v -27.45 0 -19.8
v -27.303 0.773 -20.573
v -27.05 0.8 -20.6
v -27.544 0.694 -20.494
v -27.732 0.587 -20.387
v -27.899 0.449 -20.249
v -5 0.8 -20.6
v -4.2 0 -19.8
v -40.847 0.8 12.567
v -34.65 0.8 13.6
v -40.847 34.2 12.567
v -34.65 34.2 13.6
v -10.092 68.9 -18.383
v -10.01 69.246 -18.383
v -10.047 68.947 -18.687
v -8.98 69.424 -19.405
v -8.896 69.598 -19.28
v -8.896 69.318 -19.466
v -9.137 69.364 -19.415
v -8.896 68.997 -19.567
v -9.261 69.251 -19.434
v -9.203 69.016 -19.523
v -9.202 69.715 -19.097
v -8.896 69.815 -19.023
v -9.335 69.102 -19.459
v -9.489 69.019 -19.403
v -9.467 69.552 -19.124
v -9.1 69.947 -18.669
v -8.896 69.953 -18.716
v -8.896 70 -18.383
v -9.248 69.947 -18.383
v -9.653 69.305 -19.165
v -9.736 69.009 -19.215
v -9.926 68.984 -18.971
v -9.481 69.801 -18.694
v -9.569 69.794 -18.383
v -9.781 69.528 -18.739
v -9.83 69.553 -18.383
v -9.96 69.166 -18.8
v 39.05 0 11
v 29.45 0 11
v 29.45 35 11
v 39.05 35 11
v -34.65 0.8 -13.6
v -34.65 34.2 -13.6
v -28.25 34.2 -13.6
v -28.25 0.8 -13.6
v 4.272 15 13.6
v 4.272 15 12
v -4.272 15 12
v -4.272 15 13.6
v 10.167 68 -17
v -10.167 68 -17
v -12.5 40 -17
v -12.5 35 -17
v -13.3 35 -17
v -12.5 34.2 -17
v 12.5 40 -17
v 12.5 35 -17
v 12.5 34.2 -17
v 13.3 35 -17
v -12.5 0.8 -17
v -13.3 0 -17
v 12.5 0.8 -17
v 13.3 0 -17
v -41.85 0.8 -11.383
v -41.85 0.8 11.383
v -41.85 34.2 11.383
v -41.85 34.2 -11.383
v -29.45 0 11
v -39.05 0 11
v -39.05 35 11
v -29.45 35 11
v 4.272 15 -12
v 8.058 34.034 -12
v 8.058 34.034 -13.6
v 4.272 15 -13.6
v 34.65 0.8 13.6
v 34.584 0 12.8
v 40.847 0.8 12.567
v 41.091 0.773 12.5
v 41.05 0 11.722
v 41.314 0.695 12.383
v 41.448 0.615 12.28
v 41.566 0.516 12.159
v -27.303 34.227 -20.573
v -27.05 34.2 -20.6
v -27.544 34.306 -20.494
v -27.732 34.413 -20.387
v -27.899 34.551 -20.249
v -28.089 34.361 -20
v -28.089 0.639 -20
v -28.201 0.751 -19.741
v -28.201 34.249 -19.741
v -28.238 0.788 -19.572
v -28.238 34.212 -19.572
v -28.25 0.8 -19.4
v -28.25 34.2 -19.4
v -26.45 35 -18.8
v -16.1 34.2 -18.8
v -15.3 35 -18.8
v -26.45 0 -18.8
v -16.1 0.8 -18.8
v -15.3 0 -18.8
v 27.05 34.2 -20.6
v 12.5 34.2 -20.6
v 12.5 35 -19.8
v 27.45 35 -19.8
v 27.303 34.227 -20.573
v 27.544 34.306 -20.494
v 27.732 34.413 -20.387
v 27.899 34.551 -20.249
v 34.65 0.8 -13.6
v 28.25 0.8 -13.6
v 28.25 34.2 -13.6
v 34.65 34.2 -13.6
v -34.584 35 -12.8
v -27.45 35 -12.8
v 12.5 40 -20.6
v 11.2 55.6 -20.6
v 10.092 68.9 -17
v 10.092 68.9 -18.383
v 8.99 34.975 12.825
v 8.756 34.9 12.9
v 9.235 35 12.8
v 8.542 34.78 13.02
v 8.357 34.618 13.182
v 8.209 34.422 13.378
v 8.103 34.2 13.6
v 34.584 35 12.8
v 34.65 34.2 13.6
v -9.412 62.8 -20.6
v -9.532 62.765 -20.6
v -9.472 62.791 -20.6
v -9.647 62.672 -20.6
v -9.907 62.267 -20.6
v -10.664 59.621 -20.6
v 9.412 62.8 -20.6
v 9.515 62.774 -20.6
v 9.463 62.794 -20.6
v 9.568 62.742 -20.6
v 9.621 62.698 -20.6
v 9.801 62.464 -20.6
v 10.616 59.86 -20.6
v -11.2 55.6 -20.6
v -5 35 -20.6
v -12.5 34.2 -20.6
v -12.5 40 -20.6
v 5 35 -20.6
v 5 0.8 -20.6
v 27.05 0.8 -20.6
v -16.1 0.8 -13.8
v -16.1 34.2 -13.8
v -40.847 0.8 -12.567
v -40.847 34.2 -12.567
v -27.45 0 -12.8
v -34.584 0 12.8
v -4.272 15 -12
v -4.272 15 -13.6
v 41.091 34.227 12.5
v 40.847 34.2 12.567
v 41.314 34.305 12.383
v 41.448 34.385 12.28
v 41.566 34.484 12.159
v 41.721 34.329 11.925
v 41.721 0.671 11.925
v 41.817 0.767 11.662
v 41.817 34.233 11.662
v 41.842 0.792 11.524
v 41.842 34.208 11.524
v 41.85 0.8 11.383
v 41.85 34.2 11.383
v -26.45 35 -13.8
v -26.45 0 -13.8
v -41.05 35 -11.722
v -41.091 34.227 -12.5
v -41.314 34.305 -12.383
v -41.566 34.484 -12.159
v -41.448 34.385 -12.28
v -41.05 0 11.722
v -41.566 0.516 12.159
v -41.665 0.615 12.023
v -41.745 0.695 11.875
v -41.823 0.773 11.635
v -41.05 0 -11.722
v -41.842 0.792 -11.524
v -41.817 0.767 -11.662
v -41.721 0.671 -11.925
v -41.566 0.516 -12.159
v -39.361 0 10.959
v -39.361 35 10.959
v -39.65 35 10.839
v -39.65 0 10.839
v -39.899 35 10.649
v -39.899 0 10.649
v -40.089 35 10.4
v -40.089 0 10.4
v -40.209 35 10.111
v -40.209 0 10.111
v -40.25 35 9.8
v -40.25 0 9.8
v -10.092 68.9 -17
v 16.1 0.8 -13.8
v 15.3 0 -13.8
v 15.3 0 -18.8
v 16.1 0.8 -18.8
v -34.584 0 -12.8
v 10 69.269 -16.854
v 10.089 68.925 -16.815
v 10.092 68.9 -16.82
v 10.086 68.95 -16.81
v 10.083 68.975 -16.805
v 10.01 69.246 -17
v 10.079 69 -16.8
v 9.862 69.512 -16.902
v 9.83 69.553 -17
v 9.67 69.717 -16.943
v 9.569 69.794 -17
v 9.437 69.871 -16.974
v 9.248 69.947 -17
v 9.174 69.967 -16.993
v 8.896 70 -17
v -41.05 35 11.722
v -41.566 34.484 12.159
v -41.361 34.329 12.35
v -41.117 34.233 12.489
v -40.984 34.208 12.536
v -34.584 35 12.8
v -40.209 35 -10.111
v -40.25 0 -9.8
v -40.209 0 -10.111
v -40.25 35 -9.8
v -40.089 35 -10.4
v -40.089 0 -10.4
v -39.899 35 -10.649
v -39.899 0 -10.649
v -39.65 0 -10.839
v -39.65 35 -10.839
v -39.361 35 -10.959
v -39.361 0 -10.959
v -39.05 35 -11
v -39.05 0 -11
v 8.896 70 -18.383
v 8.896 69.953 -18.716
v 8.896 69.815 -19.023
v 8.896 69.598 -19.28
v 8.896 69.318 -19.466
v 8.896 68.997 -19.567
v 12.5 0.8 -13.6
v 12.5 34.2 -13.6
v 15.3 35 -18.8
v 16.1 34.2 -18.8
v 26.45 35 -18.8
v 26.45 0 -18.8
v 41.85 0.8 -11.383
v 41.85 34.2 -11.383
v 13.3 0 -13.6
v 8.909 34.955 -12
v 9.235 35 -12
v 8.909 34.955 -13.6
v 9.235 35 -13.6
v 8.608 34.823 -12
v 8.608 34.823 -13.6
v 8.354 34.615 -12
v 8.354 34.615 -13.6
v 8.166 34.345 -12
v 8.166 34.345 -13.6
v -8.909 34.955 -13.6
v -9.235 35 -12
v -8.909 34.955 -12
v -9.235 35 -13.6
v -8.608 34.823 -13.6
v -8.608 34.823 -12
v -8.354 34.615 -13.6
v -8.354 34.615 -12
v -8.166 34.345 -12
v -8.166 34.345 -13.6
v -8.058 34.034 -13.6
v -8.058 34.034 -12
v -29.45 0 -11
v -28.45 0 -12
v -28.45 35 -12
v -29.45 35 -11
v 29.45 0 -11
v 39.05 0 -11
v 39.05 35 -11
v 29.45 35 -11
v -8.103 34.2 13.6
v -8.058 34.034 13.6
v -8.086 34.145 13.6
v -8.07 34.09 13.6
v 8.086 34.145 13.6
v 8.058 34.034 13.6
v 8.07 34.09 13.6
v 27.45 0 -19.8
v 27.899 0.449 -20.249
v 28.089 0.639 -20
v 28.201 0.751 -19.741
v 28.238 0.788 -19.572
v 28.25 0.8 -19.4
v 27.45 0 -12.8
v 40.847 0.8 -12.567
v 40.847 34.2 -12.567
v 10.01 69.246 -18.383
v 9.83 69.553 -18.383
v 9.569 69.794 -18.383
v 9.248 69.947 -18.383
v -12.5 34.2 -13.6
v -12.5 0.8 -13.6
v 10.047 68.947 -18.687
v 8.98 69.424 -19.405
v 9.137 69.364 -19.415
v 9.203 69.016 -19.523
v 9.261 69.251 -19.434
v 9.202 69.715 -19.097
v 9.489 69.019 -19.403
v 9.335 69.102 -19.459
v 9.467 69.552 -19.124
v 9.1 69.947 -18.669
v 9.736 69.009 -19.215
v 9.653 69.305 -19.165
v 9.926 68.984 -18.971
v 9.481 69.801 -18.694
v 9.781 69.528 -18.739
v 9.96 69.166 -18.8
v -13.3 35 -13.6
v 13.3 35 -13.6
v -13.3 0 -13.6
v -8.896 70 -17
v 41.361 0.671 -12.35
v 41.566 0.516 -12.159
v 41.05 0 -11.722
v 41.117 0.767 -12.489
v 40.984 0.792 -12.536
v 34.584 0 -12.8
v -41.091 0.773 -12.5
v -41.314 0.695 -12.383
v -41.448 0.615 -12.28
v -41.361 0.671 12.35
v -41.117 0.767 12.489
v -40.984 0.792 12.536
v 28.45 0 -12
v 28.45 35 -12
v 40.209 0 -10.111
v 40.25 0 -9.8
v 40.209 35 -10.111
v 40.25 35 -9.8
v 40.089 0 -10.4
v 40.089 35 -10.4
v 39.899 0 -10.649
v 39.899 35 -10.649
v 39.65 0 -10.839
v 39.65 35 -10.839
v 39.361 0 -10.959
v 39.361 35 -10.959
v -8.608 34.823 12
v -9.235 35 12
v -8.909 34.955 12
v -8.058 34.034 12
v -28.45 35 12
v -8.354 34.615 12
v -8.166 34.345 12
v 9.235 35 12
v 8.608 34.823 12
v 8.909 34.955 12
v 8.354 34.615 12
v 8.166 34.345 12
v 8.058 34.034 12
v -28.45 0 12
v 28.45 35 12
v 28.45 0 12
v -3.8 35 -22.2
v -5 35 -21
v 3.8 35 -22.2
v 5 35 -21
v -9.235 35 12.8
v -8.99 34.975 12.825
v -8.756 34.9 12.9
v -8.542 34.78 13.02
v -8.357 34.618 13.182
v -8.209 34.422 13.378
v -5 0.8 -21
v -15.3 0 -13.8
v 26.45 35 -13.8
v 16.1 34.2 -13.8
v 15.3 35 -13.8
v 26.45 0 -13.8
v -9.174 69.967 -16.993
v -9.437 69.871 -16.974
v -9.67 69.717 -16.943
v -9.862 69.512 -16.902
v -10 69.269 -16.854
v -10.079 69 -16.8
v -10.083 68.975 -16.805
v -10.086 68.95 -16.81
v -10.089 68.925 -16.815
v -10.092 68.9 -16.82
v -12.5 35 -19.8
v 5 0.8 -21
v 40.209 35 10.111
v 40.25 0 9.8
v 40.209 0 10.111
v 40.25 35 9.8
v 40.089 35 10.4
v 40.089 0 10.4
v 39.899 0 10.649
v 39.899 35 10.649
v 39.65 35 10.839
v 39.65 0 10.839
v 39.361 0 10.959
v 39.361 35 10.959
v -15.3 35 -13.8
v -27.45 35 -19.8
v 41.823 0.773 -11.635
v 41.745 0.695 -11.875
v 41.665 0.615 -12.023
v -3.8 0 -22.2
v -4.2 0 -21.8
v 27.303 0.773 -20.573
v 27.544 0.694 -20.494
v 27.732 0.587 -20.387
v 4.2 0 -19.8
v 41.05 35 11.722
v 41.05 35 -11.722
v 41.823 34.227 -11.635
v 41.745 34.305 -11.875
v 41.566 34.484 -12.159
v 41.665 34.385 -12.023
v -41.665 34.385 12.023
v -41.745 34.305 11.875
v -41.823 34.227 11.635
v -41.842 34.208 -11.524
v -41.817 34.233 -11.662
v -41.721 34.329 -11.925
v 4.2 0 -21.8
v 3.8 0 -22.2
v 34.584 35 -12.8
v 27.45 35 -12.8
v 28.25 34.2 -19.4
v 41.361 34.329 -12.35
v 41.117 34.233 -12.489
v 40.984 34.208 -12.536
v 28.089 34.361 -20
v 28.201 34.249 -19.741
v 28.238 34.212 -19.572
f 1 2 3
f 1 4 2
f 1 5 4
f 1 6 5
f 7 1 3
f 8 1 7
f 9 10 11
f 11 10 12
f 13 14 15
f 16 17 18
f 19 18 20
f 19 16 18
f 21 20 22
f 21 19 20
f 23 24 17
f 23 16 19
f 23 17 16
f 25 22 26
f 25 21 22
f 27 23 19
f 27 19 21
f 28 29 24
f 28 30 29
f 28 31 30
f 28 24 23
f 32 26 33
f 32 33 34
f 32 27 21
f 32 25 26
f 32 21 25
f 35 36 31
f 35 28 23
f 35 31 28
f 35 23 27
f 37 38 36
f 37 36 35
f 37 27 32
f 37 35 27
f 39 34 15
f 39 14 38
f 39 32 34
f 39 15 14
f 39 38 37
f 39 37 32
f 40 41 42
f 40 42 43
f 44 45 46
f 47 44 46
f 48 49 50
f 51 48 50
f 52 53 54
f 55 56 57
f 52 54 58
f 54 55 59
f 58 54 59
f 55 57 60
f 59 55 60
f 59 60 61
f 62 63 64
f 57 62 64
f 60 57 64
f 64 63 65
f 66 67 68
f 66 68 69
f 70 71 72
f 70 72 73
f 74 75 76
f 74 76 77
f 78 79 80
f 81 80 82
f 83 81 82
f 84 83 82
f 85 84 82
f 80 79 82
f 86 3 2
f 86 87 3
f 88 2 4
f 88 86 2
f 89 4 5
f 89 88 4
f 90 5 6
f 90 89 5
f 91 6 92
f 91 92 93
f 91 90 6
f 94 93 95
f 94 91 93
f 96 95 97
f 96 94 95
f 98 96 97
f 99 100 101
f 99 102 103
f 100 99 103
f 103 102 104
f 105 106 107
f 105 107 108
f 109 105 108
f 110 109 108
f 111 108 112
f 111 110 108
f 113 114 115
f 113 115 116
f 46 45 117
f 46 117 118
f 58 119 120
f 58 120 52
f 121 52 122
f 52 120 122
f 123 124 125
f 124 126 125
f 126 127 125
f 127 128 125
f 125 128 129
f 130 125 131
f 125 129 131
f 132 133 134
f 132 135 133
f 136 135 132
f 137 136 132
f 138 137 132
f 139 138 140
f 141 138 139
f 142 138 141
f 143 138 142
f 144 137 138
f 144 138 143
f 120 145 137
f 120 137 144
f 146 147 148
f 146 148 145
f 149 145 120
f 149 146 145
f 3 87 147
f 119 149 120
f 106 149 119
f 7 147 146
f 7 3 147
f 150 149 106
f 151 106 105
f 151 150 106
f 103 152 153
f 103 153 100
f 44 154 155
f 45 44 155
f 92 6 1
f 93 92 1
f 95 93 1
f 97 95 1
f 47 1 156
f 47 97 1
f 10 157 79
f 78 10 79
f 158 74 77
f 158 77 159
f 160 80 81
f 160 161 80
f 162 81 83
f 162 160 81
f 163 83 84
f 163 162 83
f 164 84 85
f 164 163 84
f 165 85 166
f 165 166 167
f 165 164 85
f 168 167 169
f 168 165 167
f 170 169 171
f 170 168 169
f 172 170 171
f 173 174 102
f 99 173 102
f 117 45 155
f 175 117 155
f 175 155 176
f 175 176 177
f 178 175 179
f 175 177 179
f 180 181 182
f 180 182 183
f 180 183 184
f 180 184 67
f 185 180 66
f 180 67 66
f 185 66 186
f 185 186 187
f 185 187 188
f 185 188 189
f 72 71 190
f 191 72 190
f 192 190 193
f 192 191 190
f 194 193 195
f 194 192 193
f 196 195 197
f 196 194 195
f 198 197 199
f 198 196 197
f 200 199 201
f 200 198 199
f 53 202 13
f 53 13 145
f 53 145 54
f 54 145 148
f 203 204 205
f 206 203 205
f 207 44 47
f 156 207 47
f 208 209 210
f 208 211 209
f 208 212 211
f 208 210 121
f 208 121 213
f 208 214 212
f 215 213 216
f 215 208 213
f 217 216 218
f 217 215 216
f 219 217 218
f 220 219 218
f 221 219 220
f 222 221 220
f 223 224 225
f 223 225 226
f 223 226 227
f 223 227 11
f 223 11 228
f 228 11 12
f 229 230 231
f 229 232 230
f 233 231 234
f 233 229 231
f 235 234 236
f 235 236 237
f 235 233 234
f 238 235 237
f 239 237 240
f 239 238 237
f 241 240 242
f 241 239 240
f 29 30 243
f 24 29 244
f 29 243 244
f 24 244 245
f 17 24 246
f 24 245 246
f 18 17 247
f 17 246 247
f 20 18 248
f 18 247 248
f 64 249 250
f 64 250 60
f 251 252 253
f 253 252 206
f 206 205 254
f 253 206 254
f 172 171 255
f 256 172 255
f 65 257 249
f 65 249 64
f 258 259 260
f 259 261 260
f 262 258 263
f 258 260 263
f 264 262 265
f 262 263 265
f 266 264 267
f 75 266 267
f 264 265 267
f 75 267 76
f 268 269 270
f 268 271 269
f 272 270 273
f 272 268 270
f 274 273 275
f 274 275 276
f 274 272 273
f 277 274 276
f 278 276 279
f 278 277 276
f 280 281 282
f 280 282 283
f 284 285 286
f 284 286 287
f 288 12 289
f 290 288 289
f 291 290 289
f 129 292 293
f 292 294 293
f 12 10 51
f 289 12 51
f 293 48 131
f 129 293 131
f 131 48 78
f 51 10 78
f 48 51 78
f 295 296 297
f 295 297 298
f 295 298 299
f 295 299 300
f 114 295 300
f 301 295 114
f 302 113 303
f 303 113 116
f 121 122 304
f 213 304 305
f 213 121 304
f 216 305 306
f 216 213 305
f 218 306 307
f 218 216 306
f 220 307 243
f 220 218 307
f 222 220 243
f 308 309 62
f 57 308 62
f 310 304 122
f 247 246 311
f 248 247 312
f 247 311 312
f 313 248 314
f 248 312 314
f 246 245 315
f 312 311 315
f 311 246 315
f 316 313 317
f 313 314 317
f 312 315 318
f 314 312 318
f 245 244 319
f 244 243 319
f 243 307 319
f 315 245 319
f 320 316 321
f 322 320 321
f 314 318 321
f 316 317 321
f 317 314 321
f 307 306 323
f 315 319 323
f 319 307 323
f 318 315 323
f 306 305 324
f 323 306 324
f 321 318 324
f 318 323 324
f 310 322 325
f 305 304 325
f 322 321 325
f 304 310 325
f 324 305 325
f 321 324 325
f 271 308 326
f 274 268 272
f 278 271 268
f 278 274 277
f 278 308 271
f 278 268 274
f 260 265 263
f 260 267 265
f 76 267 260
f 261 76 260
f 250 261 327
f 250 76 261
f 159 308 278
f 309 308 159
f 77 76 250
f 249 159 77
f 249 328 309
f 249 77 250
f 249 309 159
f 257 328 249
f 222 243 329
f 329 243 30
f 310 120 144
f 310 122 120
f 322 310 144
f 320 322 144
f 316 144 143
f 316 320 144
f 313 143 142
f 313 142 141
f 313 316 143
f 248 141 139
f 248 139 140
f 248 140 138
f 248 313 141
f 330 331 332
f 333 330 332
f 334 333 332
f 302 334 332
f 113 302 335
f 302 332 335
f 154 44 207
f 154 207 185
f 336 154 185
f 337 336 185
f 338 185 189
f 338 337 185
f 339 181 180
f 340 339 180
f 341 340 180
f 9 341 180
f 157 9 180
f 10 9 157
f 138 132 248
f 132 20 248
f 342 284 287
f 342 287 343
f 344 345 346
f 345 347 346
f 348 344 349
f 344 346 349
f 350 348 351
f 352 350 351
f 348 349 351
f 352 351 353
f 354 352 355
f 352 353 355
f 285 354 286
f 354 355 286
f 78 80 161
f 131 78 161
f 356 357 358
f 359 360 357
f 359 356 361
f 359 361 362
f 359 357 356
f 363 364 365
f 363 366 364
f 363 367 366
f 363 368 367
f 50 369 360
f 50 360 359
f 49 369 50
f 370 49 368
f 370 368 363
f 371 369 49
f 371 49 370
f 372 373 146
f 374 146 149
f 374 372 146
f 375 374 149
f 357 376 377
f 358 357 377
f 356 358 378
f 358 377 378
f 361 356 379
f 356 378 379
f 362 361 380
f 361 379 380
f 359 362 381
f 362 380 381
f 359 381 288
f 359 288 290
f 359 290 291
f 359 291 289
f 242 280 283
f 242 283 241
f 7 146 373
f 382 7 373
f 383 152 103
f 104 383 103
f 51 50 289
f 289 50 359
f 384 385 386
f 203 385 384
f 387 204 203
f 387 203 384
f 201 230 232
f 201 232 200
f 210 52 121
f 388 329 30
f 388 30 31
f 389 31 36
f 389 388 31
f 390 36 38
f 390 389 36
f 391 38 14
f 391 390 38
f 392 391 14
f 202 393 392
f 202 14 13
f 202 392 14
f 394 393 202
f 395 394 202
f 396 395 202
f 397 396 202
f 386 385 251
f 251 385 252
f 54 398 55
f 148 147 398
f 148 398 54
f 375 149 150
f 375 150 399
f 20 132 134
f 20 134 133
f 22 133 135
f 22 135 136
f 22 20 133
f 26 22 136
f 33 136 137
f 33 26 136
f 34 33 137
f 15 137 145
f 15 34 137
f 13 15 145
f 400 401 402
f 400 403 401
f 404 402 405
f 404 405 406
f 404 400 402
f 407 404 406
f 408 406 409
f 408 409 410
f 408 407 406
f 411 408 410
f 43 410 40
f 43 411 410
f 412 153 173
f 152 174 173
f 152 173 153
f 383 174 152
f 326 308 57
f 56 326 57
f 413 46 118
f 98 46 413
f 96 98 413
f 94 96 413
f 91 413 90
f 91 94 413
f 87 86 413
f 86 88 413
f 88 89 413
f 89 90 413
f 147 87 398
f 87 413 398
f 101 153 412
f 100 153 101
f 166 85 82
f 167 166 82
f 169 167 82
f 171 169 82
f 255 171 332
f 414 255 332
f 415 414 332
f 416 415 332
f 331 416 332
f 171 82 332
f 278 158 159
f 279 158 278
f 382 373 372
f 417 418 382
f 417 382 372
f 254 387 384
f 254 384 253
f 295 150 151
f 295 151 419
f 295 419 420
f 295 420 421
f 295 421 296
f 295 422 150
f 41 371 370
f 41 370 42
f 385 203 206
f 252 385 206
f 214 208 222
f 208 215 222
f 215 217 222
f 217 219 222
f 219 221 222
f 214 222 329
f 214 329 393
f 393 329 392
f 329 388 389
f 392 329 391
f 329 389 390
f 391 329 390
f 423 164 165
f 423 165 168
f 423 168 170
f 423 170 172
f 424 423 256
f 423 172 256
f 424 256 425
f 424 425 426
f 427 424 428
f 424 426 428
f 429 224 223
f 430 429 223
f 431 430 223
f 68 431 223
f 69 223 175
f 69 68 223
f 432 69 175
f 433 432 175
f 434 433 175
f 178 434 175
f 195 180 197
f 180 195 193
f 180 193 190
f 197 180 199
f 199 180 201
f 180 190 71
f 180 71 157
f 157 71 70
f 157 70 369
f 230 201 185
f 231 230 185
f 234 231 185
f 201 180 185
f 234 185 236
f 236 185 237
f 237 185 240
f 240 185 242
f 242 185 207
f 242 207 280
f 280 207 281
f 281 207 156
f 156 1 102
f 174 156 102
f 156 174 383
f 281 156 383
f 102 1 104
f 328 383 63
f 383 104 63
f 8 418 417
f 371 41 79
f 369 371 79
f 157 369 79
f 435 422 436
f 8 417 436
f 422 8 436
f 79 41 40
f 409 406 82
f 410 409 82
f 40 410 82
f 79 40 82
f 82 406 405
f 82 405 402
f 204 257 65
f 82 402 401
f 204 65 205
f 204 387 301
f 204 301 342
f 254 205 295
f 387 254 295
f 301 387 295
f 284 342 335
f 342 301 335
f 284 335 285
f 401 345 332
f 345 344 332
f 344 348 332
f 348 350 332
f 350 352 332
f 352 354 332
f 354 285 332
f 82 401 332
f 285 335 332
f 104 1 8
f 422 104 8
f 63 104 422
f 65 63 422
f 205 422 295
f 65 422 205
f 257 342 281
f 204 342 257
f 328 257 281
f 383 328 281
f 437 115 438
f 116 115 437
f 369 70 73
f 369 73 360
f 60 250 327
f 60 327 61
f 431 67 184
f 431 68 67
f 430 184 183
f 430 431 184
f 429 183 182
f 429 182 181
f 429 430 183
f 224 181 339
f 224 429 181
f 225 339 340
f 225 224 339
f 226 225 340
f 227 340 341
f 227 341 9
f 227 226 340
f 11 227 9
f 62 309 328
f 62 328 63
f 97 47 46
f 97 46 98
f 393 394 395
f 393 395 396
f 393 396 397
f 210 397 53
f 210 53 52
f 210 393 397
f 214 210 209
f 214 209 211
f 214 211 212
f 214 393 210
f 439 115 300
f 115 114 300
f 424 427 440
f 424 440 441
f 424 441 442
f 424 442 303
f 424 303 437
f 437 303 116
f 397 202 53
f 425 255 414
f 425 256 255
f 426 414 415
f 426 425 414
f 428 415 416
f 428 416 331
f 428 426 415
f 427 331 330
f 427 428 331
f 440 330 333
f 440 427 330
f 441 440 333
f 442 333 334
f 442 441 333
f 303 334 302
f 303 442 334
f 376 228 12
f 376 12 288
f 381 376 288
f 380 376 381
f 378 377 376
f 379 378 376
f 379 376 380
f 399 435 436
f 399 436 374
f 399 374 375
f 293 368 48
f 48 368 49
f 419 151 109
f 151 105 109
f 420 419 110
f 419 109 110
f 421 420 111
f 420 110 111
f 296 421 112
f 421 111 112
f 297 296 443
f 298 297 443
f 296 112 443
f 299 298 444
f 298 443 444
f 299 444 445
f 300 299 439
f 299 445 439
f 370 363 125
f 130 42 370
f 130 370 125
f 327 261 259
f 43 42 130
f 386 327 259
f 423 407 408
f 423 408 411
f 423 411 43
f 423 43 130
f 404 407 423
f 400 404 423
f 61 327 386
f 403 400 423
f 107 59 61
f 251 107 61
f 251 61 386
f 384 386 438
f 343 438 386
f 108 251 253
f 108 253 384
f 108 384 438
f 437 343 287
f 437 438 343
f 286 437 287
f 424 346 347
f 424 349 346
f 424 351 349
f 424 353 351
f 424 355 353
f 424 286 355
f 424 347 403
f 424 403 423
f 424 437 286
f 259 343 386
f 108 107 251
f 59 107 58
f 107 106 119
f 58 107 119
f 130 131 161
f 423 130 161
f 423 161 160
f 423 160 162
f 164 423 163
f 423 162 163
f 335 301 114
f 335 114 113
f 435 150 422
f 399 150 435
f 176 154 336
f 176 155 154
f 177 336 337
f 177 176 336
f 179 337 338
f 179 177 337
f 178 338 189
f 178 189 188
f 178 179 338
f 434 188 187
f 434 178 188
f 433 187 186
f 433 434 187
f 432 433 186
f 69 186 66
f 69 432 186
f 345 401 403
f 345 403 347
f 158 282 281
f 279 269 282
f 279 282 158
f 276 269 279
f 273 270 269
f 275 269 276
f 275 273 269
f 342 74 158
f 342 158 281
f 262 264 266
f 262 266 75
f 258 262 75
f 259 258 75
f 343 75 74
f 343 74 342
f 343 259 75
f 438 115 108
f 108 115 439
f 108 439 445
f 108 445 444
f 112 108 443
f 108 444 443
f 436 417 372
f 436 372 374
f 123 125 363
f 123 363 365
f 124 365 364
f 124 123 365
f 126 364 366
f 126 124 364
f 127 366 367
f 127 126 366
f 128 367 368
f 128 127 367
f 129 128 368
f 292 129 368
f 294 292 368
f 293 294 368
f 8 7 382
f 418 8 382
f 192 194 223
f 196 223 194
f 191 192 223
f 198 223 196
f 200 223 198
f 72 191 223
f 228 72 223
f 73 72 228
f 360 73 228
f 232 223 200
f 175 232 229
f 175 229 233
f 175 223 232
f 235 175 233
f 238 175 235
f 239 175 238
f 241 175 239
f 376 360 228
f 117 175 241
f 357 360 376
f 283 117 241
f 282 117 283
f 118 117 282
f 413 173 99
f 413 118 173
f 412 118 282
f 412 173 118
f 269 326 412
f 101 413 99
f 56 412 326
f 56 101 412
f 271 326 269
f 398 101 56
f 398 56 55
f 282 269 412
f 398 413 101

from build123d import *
from OCP.BRepFilletAPI import BRepFilletAPI_MakeChamfer

# Parameters (mm, degrees)
SKETCH1_W                      = 83.7
SKETCH1_H                      = 27.2
BOSS_EXTRUDE1_DEPTH            = 35
CUT_EXTRUDE1_REACH             = 58.226
SKETCH3_W                      = 56.5
SKETCH3_H                      = 3.4
BOSS_EXTRUDE2_DEPTH            = 3.2
SKETCH4_W                      = 56.5
SKETCH4_H                      = 3.6
BOSS_EXTRUDE3_DEPTH            = 70
CUT_EXTRUDE2_START             = -20.6
SKETCH5_W                      = 15.75
SKETCH5_H                      = 35
CUT_EXTRUDE2_DEPTH             = 3.6
SKETCH6_W                      = 15.75
SKETCH6_H                      = 3.4
BOSS_EXTRUDE4_DEPTH            = 35
CUT_EXTRUDE3_REACH             = 86.118
SKETCH7_W                      = 25
SKETCH7_H                      = 3.4
CUT_EXTRUDE4_START             = -20.6
CUT_EXTRUDE4_DEPTH             = 3.6
CUT_EXTRUDE5_REACH             = 86.118
SKETCH9_W                      = 10.35
SKETCH9_H                      = 5
CUT_EXTRUDE6_REACH             = 86.118
CUT_EXTRUDE6_DIRECTION_2_REACH = 86.118
SKETCH11_W                     = 10
SKETCH11_H                     = 1.6
BOSS_EXTRUDE5_DEPTH            = 35
BOSS_EXTRUDE6_START            = -17
BOSS_EXTRUDE6_DEPTH            = 0.2
CHAMFER1_SIZE                  = 7.2
CHAMFER1_SIZE2                 = 1.2
CHAMFER2_SIZE                  = 1.2
CHAMFER2_SIZE2                 = 7.2
CHAMFER3_SIZE                  = 1.2
CHAMFER4_SIZE                  = 0.8
CHAMFER5_SIZE                  = 0.2
CHAMFER5_SIZE_2                = 1
FILLET1_R                      = 1.2


# Some blends are built 0.0001 mm under size
with BuildPart() as part:
    # Sketch1 → Boss-Extrude1 (new body)
    with BuildSketch(Plane(origin=(0, 0, 0), x_dir=(1, 0, 0), z_dir=(0, 1, 0))):
        Rectangle(SKETCH1_W, SKETCH1_H)
    extrude(amount=BOSS_EXTRUDE1_DEPTH)

    # Sketch2 → Cut-Extrude1 (cut, up to next)
    with BuildSketch(Plane(origin=(0, 0, 0), x_dir=(1, 0, 0), z_dir=(0, 1, 0)), mode=Mode.PRIVATE) as cut_extrude1_sk1:
        Polygon((-28.25, 12), (-28.25, 11), (-40.25, 11), (-40.25, -11), (-28.25, -11), (-28.25, -12), (28.25, -12), (28.25, -11), (40.25, -11), (40.25, 11), (28.25, 11), (28.25, 12), align=None)
    cut_extrude1_tool1 = extrude(cut_extrude1_sk1.sketch, amount=CUT_EXTRUDE1_REACH, mode=Mode.PRIVATE) & part.part
    add(cut_extrude1_tool1.solids().sort_by_distance((0, 0, 0))[0], mode=Mode.SUBTRACT)

    # Sketch3 → Boss-Extrude2 (add)
    with BuildSketch(Plane(origin=(0, 0, 0), x_dir=(1, 0, 0), z_dir=(0, 1, 0))):
        with Locations((0, 15.3)):
            Rectangle(SKETCH3_W, SKETCH3_H)
    extrude(amount=BOSS_EXTRUDE2_DEPTH)

    # Sketch4 → Boss-Extrude3 (add)
    with BuildSketch(Plane(origin=(0, 0, 0), x_dir=(1, 0, 0), z_dir=(0, 1, 0))):
        with Locations((0, 18.8)):
            Rectangle(SKETCH4_W, SKETCH4_H)
    extrude(amount=BOSS_EXTRUDE3_DEPTH)

    # Sketch5 → Cut-Extrude2 (cut)
    with BuildSketch(Plane.XY.offset(CUT_EXTRUDE2_START)):
        with Locations((-20.375, 52.5)):
            Rectangle(SKETCH5_W, SKETCH5_H)
        with Locations((20.375, 52.5)):
            Rectangle(SKETCH5_W, SKETCH5_H)
    extrude(amount=CUT_EXTRUDE2_DEPTH, mode=Mode.SUBTRACT)

    # Sketch6 → Boss-Extrude4 (add)
    with BuildSketch(Plane(origin=(0, 0, 0), x_dir=(1, 0, 0), z_dir=(0, 1, 0))):
        with Locations((-20.375, 15.3)):
            Rectangle(SKETCH6_W, SKETCH6_H)
        with Locations((20.375, 15.3)):
            Rectangle(SKETCH6_W, SKETCH6_H)
    extrude(amount=BOSS_EXTRUDE4_DEPTH)

    # Sketch7 → Cut-Extrude3 (cut, up to next)
    with BuildSketch(Plane(origin=(0, 0, 0), x_dir=(1, 0, 0), z_dir=(0, 1, 0)), mode=Mode.PRIVATE) as cut_extrude3_sk1:
        with Locations((0, 15.3)):
            Rectangle(SKETCH7_W, SKETCH7_H)
    cut_extrude3_tool1 = extrude(cut_extrude3_sk1.sketch, amount=CUT_EXTRUDE3_REACH, mode=Mode.PRIVATE) & part.part
    add(cut_extrude3_tool1.solids().sort_by_distance((0, 0, -15.3))[0], mode=Mode.SUBTRACT)

    # Sketch8 → Cut-Extrude4 (cut)
    with BuildSketch(Plane.XY.offset(CUT_EXTRUDE4_START)):
        Polygon((12.5, 40), (10, 70), (12.5, 70), align=None)
        Polygon((-12.5, 70), (-10, 70), (-12.5, 40), align=None)
    extrude(amount=CUT_EXTRUDE4_DEPTH, mode=Mode.SUBTRACT)

    # Sketch9 → Cut-Extrude5 (cut, up to next)
    with BuildSketch(Plane(origin=(0, 0, 0), x_dir=(1, 0, 0), z_dir=(0, 1, 0)), mode=Mode.PRIVATE) as cut_extrude5_sk1:
        with Locations((-21.275, 16.3)):
            Rectangle(SKETCH9_W, SKETCH9_H)
    cut_extrude5_tool1 = extrude(cut_extrude5_sk1.sketch, amount=CUT_EXTRUDE5_REACH, mode=Mode.PRIVATE) & part.part
    # Sketch9 → Cut-Extrude5 (cut, up to next)
    with BuildSketch(Plane(origin=(0, 0, 0), x_dir=(1, 0, 0), z_dir=(0, 1, 0)), mode=Mode.PRIVATE) as cut_extrude5_sk2:
        with Locations((21.275, 16.3)):
            Rectangle(SKETCH9_W, SKETCH9_H)
    cut_extrude5_tool2 = extrude(cut_extrude5_sk2.sketch, amount=CUT_EXTRUDE5_REACH, mode=Mode.PRIVATE) & part.part
    add(cut_extrude5_tool1.solids().sort_by_distance((-21.275, 0, -16.3))[0], mode=Mode.SUBTRACT)
    add(cut_extrude5_tool2.solids().sort_by_distance((21.275, 0, -16.3))[0], mode=Mode.SUBTRACT)

    # Sketch10 → Cut-Extrude6 (cut, up to next)
    with BuildSketch(Plane.XY, mode=Mode.PRIVATE) as cut_extrude6_sk1:
        Polygon((-8.25, 35), (8.25, 35), (4.271752652, 15), (-4.271752652, 15), align=None)
    cut_extrude6_tool1 = extrude(cut_extrude6_sk1.sketch, amount=-CUT_EXTRUDE6_REACH, mode=Mode.PRIVATE) & part.part
    add(cut_extrude6_tool1.solids().sort_by_distance((0, 26.059023, 0))[0], mode=Mode.SUBTRACT)

    # Sketch10 → Cut-Extrude6 direction 2 (cut, up to next)
    with BuildSketch(Plane.XY, mode=Mode.PRIVATE) as cut_extrude6_direction_2_sk1:
        Polygon((-8.25, 35), (8.25, 35), (4.271752652, 15), (-4.271752652, 15), align=None)
    cut_extrude6_direction_2_tool1 = extrude(cut_extrude6_direction_2_sk1.sketch, amount=CUT_EXTRUDE6_DIRECTION_2_REACH, mode=Mode.PRIVATE) & part.part
    add(cut_extrude6_direction_2_tool1.solids().sort_by_distance((0, 26.059023, 0))[0], mode=Mode.SUBTRACT)

    # Sketch11 → Boss-Extrude5 (add)
    with BuildSketch(Plane(origin=(0, 0, 0), x_dir=(1, 0, 0), z_dir=(0, 1, 0))):
        with Locations((0, 21.4)):
            Rectangle(SKETCH11_W, SKETCH11_H)
    extrude(amount=BOSS_EXTRUDE5_DEPTH)

    # Sketch12 → Boss-Extrude6 (add)
    with BuildSketch(Plane.XY.offset(BOSS_EXTRUDE6_START)):
        Polygon((-10, 70), (-10.166666667, 68), (10.166666667, 68), (10, 70), align=None)
    extrude(amount=BOSS_EXTRUDE6_DEPTH)

    # Chamfer1: one chamfer whose edges measure the first distance from different faces: ONE call of the kernel's chamfer builder (chamfer() names one face for all edges)
    chamfer1_edges_1 = [part.edges().sort_by_distance(p)[0] for p in [
        (0, 70, -20.6),
    ]]
    chamfer1_side_1 = [part.faces().sort_by_distance(p)[0] for p in [
        (16.625, 0.899569341, -20.6),
    ]]
    chamfer1_edges_2 = [part.edges().sort_by_distance(p)[0] for p in [
        (-41.85, 17.5, -13.6),
    ]]
    chamfer1_side_2 = [part.faces().sort_by_distance(p)[0] for p in [
        (-35.05, 17.5, -13.6),
    ]]
    chamfer1_edges_3 = [part.edges().sort_by_distance(p)[0] for p in [
        (41.85, 17.5, 13.6),
    ]]
    chamfer1_side_3 = [part.faces().sort_by_distance(p)[0] for p in [
        (0, 0.907231503, 13.6),
    ]]
    chamfer1 = BRepFilletAPI_MakeChamfer(part.part.solid().wrapped)
    for e in chamfer1_edges_1:
        chamfer1.Add(CHAMFER1_SIZE, CHAMFER1_SIZE2, e.wrapped, chamfer1_side_1[0].wrapped)  # the first distance lies on this face
    for e in chamfer1_edges_2:
        chamfer1.Add(CHAMFER1_SIZE, CHAMFER1_SIZE2, e.wrapped, chamfer1_side_2[0].wrapped)  # the first distance lies on this face
    for e in chamfer1_edges_3:
        chamfer1.Add(CHAMFER1_SIZE, CHAMFER1_SIZE2, e.wrapped, chamfer1_side_3[0].wrapped)  # the first distance lies on this face
    add(Compound.cast(chamfer1.Shape()), mode=Mode.REPLACE)

    # Chamfer2: one chamfer whose edges measure the first distance from different faces: ONE call of the kernel's chamfer builder (chamfer() names one face for all edges)
    chamfer2_edges_1 = [part.edges().sort_by_distance(p)[0] for p in [
        (41.85, 17.5, -13.6),
    ]]
    chamfer2_side_1 = [part.faces().sort_by_distance(p)[0] for p in [
        (41.85, 17.5, -0.6),
    ]]
    chamfer2_edges_2 = [part.edges().sort_by_distance(p)[0] for p in [
        (-41.85, 17.5, 13.6),
    ]]
    chamfer2_side_2 = [part.faces().sort_by_distance(p)[0] for p in [
        (-41.85, 17.5, 0.6),
    ]]
    chamfer2 = BRepFilletAPI_MakeChamfer(part.part.solid().wrapped)
    for e in chamfer2_edges_1:
        chamfer2.Add(CHAMFER2_SIZE, CHAMFER2_SIZE2, e.wrapped, chamfer2_side_1[0].wrapped)  # the first distance lies on this face
    for e in chamfer2_edges_2:
        chamfer2.Add(CHAMFER2_SIZE, CHAMFER2_SIZE2, e.wrapped, chamfer2_side_2[0].wrapped)  # the first distance lies on this face
    add(Compound.cast(chamfer2.Shape()), mode=Mode.REPLACE)

    # Chamfer3
    # the kernel refuses this chamfer: 1.2 mm, written as the material it takes off along each edge
    with BuildSketch(Plane(origin=(28.25, -3.086019586, -11), x_dir=(0.9996219169112968, 0, 0.027495876610585904), z_dir=(0, 1, 0))) as chamfer3_piece_1_section:
        Polygon((CHAMFER3_SIZE * 0.999621916911, CHAMFER3_SIZE * 0.0274958766106), (-CHAMFER3_SIZE * 0.0274958766106, CHAMFER3_SIZE * 0.999621916911), (0, 0), align=None)
    chamfer3_piece_1 = extrude(amount=41.172039171, mode=Mode.PRIVATE)
    chamfer3_piece_1 = split(chamfer3_piece_1, bisect_by=Plane(origin=(28.660431829, 17.5, -12), z_dir=(0, 0, 1)), keep=Keep.TOP, mode=Mode.PRIVATE)
    add(chamfer3_piece_1, mode=Mode.SUBTRACT)
    with BuildSketch(Plane(origin=(28.25, -3.086019586, 11), x_dir=(-0.027495876610587378, 0, 0.9996219169112965), z_dir=(0, 1, 0))) as chamfer3_piece_2_section:
        Polygon((CHAMFER3_SIZE * 0.999621916911, CHAMFER3_SIZE * 0.0274958766106), (-CHAMFER3_SIZE * 0.0274958766106, CHAMFER3_SIZE * 0.999621916911), (0, 0), align=None)
    chamfer3_piece_2 = extrude(amount=41.172039171, mode=Mode.PRIVATE)
    chamfer3_piece_2 = split(chamfer3_piece_2, bisect_by=Plane(origin=(28.660431829, 17.5, 12), z_dir=(0, 0, -1)), keep=Keep.TOP, mode=Mode.PRIVATE)
    add(chamfer3_piece_2, mode=Mode.SUBTRACT)
    with BuildSketch(Plane(origin=(-28.25, -3.086019586, 11), x_dir=(-0.9996219169112968, 0, -0.027495876610585904), z_dir=(0, 1, 0))) as chamfer3_piece_3_section:
        Polygon((CHAMFER3_SIZE * 0.999621916911, CHAMFER3_SIZE * 0.0274958766106), (-CHAMFER3_SIZE * 0.0274958766106, CHAMFER3_SIZE * 0.999621916911), (0, 0), align=None)
    chamfer3_piece_3 = extrude(amount=41.172039171, mode=Mode.PRIVATE)
    chamfer3_piece_3 = split(chamfer3_piece_3, bisect_by=Plane(origin=(-28.660431829, 17.5, 12), z_dir=(0, 0, -1)), keep=Keep.TOP, mode=Mode.PRIVATE)
    add(chamfer3_piece_3, mode=Mode.SUBTRACT)
    with BuildSketch(Plane(origin=(-28.25, -3.086019586, -11), x_dir=(0.027495876610587378, 0, -0.9996219169112965), z_dir=(0, 1, 0))) as chamfer3_piece_4_section:
        Polygon((CHAMFER3_SIZE * 0.999621916911, CHAMFER3_SIZE * 0.0274958766106), (-CHAMFER3_SIZE * 0.0274958766106, CHAMFER3_SIZE * 0.999621916911), (0, 0), align=None)
    chamfer3_piece_4 = extrude(amount=41.172039171, mode=Mode.PRIVATE)
    chamfer3_piece_4 = split(chamfer3_piece_4, bisect_by=Plane(origin=(-28.660431829, 17.5, -12), z_dir=(0, 0, 1)), keep=Keep.TOP, mode=Mode.PRIVATE)
    add(chamfer3_piece_4, mode=Mode.SUBTRACT)
    with BuildSketch(Plane(origin=(-5, -3.086019586, -22.2), x_dir=(-0.027495876610586622, 0, 0.9996219169112968), z_dir=(0, 1, 0)), Plane(origin=(5, -3.086019586, -22.2), x_dir=(-0.9996219169112968, 0, -0.027495876610587354), z_dir=(0, 1, 0))) as chamfer3_piece_5:
        Polygon((CHAMFER3_SIZE * 0.999621916911, CHAMFER3_SIZE * 0.0274958766106), (-CHAMFER3_SIZE * 0.0274958766106, CHAMFER3_SIZE * 0.999621916911), (0, 0), align=None)
    extrude(amount=41.172039171, mode=Mode.SUBTRACT)

    # Chamfer4
    chamfer4_edges = [part.edges().sort_by_distance(p)[0] for p in [
        (-38.25, 0, 13),
        (0, 0, 13.6),
        (38.25, 0, 13),
        (41.85, 0, 0),
        (38.25, 0, -13),
        (31.45, 0, -13.6),
        (28.25, 0, -17.1),
        (16.625, 0, -20.6),
        (5, 0, -20.8),
        (-5, 0, -20.8),
        (-16.625, 0, -20.6),
        (-28.25, 0, -17.1),
        (-31.45, 0, -13.6),
        (-38.25, 0, -13),
        (-41.85, 0, 0),
        (16.1, 0, -16.3),
        (-12.5, 0, -15.3),
        (12.5, 0, -15.3),
        (-16.1, 0, -16.3),
        (-38.25, 35, 13),
        (-21.45, 35, 13.6),
        (21.45, 35, 13.6),
        (38.25, 35, 13),
        (41.85, 35, 0),
        (38.25, 35, -13),
        (31.45, 35, -13.6),
        (28.25, 35, -17.1),
        (-20.375, 35, -20.6),
        (20.375, 35, -20.6),
        (-28.25, 35, -17.1),
        (-31.45, 35, -13.6),
        (-38.25, 35, -13),
        (-41.85, 35, 0),
        (16.1, 35, -16.3),
        (-12.5, 35, -15.3),
        (12.5, 35, -15.3),
        (-16.1, 35, -16.3),
    ]]
    chamfer(chamfer4_edges, length=CHAMFER4_SIZE)

    # Chamfer5
    chamfer5_edges_1 = [part.edges().sort_by_distance(p)[0] for p in [
        (0, 68, -16.8),
    ]]
    chamfer5_side_1 = [part.faces().sort_by_distance(p)[0] for p in [
        (0, 68, -16.804),
    ]]
    chamfer5_edges_2 = [part.edges().sort_by_distance(p)[0] for p in [
        (0, 70, -16.8),
    ]]
    chamfer5_side_2 = [part.faces().sort_by_distance(p)[0] for p in [
        (0, 69.996, -16.8),
    ]]
    chamfer5 = BRepFilletAPI_MakeChamfer(part.part.solid().wrapped)
    for e in chamfer5_edges_1:
        chamfer5.Add(CHAMFER5_SIZE - 0.0001, CHAMFER5_SIZE_2 - 0.0001, e.wrapped, chamfer5_side_1[0].wrapped)
    for e in chamfer5_edges_2:
        chamfer5.Add(CHAMFER5_SIZE_2 - 0.0001, CHAMFER5_SIZE - 0.0001, e.wrapped, chamfer5_side_2[0].wrapped)
    add(Compound.cast(chamfer5.Shape()), mode=Mode.REPLACE)  # a hair under: the kernel refuses the full size

    # Fillet1
    fillet1_edges = [part.edges().sort_by_distance(p)[0] for p in [
        (8.25, 35, -12.8),
        (-8.25, 35, -12.8),
        (-40.25, 17.5, -11),
        (-10, 70, -18.19995),
        (10, 70, -18.19995),
        (0, 70, -19.4),
        (-10.3, 66.4, -20),
        (10.3, 66.4, -20),
        (-40.25, 17.5, 11),
        (40.25, 17.5, 11),
        (40.25, 17.5, -11),
        (-8.25, 35, 12.4),
        (8.25, 35, 12.4),
        (28.25, 17.5, -20.6),
        (-28.25, 17.5, -20.6),
        (41.85, 17.5, -12.4),
        (41.85, 17.5, 12.4),
        (-41.85, 17.5, -12.4),
        (-41.85, 17.5, 12.4),
    ]]
    fillet(fillet1_edges, radius=FILLET1_R)


solid = part.part
